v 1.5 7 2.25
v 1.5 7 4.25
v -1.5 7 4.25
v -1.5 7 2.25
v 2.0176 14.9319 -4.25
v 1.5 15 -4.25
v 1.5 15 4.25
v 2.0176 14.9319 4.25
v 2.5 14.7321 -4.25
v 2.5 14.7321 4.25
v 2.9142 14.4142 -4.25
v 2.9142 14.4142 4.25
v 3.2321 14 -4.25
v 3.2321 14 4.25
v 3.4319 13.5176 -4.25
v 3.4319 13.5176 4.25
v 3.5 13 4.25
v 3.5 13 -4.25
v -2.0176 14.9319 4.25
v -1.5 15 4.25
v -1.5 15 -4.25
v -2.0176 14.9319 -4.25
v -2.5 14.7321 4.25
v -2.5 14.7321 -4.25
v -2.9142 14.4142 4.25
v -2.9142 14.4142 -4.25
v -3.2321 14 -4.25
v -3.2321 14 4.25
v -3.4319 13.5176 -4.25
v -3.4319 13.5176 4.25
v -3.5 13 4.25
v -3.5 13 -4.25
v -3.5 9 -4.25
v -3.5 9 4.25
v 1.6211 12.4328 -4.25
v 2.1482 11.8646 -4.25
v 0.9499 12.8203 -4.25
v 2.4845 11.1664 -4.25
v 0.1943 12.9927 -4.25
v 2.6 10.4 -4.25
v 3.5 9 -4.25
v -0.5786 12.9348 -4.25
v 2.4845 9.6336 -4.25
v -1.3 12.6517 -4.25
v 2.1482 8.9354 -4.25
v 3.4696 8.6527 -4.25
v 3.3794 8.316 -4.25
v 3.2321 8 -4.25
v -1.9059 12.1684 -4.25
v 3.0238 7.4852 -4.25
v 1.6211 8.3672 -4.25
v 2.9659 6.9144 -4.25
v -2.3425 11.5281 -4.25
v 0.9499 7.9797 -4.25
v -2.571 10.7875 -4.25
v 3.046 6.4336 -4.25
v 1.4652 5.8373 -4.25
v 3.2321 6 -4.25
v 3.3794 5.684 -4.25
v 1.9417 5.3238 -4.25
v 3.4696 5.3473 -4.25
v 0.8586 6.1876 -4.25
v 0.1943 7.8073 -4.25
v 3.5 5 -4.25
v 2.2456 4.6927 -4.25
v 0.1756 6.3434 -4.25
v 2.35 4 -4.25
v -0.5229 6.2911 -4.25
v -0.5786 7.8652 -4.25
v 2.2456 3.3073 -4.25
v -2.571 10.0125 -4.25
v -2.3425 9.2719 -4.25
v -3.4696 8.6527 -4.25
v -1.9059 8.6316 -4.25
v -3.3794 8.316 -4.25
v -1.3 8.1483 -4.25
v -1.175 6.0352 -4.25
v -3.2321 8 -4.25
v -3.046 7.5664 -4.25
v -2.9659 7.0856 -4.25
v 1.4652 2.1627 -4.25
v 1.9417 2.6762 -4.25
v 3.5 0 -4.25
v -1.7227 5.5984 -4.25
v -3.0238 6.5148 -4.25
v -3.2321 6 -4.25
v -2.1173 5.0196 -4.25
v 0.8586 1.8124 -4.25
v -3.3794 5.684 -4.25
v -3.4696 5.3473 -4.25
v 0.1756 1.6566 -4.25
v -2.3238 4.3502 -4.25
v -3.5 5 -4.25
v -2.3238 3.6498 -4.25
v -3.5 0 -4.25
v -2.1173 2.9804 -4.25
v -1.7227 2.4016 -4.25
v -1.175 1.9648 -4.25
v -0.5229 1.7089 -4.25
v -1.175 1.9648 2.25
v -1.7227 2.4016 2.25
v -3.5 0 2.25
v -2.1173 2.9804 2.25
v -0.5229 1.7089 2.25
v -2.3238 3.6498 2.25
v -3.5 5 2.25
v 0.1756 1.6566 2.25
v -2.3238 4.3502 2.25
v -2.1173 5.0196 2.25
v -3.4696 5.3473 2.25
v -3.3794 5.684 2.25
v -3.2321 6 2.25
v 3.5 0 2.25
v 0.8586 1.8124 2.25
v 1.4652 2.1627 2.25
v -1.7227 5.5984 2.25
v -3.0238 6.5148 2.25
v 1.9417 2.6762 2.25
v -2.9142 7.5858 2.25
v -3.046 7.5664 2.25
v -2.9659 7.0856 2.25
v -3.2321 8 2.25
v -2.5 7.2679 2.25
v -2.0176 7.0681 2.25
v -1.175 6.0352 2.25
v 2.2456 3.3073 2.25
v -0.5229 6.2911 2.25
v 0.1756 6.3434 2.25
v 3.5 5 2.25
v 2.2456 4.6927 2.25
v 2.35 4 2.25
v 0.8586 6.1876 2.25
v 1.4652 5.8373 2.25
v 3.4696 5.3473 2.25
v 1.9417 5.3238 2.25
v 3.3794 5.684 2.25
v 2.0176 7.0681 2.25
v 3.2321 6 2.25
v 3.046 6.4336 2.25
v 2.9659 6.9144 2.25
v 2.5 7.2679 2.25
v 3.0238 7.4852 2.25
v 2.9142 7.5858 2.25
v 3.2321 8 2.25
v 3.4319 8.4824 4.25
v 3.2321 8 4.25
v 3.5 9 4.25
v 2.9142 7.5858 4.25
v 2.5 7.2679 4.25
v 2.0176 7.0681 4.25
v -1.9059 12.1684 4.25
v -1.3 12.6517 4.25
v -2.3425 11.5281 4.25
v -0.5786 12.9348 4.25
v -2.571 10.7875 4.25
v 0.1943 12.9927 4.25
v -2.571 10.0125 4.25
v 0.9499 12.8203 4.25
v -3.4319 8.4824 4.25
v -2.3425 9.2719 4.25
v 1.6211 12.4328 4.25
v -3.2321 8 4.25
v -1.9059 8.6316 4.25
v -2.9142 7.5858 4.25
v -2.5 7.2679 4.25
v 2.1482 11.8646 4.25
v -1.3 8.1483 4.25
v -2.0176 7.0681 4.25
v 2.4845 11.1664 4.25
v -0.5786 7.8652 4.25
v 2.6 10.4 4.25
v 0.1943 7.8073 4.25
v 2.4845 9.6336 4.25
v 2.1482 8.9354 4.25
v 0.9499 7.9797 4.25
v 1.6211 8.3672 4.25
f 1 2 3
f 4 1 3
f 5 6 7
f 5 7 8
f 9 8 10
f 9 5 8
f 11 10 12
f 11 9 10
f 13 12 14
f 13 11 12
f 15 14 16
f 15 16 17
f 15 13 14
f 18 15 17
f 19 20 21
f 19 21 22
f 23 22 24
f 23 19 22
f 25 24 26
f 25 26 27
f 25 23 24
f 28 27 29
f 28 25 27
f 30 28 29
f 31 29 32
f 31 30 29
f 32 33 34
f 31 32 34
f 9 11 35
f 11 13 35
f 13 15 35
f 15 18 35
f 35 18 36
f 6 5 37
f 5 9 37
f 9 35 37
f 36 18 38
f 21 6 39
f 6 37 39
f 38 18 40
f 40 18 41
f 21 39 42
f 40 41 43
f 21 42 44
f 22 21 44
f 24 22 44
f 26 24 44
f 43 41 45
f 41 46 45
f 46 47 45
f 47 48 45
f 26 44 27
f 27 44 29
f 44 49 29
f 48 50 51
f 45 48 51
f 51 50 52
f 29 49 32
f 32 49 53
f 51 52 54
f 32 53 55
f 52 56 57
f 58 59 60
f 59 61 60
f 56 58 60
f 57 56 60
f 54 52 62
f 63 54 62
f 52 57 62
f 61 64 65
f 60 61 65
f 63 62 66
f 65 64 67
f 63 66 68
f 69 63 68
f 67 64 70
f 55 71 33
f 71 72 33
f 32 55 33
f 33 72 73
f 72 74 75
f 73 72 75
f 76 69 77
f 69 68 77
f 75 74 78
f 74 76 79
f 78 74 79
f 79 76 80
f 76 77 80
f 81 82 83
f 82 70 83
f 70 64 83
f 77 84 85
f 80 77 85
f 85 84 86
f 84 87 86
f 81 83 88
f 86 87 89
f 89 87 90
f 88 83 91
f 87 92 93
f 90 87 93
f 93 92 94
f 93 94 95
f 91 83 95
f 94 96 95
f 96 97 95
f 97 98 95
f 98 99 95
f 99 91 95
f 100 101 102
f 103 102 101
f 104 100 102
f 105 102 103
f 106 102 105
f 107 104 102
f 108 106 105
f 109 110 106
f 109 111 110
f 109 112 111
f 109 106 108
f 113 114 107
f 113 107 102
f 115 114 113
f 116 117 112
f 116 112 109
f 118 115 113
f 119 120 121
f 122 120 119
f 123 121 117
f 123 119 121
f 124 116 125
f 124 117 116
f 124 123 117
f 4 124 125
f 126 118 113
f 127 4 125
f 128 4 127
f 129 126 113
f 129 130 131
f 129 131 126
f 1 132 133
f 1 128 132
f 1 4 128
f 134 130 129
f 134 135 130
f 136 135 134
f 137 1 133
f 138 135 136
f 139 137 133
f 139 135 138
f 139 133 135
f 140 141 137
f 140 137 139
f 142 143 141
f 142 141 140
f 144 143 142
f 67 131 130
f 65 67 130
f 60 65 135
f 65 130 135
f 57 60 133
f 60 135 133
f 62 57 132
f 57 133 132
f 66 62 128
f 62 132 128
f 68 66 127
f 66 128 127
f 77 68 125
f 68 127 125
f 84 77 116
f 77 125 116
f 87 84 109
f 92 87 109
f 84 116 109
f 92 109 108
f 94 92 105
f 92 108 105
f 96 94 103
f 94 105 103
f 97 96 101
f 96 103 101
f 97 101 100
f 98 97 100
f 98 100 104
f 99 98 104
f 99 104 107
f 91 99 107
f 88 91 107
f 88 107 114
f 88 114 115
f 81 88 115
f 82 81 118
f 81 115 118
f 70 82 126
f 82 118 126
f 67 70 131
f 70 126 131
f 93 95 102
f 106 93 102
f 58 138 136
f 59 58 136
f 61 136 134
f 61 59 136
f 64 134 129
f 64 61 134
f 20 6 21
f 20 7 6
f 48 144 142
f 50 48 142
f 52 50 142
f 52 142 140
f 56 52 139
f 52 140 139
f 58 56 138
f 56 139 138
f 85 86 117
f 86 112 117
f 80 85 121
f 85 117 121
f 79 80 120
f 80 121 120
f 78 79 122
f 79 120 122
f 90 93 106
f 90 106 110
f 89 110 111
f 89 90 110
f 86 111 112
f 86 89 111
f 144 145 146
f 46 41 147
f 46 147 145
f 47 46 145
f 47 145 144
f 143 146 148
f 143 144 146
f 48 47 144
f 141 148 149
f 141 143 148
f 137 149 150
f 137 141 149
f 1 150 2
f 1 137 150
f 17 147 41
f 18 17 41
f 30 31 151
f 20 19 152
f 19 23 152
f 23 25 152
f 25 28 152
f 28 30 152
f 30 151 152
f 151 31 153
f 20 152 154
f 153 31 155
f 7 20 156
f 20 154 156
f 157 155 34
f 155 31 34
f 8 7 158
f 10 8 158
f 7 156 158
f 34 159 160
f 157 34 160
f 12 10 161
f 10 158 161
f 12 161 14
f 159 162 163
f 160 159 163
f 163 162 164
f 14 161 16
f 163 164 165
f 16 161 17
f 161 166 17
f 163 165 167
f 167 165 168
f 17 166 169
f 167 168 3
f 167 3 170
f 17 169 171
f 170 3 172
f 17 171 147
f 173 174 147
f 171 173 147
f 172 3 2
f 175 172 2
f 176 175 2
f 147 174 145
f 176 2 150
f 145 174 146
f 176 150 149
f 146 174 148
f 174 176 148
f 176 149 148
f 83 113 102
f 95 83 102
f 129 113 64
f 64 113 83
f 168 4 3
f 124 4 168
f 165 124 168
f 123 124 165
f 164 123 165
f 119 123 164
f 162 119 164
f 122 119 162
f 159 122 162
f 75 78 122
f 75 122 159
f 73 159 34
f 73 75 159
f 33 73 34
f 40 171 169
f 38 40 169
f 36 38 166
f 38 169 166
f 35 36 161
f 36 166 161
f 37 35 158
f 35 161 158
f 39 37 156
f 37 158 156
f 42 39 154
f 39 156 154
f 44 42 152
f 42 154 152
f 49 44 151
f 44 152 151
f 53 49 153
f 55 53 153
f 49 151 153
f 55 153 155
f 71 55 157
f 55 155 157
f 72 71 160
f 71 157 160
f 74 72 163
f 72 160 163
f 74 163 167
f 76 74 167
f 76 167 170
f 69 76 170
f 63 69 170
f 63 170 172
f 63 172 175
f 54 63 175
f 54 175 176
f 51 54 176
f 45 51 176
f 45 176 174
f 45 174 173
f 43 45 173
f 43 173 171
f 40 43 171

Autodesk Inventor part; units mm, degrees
ref_plane "YZ Plane" through (0, 0, 0) normal (1, 0, 0) x (0, 1, 0)
ref_plane "XZ Plane" through (0, 0, 0) normal (0, 1, 0) x (-1, 0, 0)
ref_plane "XY Plane" through (0, 0, 0) normal (0, 0, 1) x (1, 0, 0)
sketch "スケッチ1" plane through (0, 0, 0) normal (0, 1, 0) x (-1, 0, 0)
  line L0 (3.5, 4.25) -> (-3.5, 4.25)
  line L1 (-3.5, 4.25) -> (-3.5, -4.25)
  line L2 (-3.5, -4.25) -> (3.5, -4.25)
  line L3 (3.5, -4.25) -> (3.5, 4.25)
  line L4 (3.5, 4.25) -> (-3.5, -4.25) construction
  line L5 (-3.5, 4.25) -> (3.5, -4.25) construction
  point P0 (0, 0)
  dimension "d0" = 7
  dimension "d1" = 8.5
extrude "押し出し1" add sketch "スケッチ1" along normal blind 15
sketch "スケッチ2" plane through (-3.5, 0, 4.25) normal (0, 0, 1) x (1, 0, 0)
  circle A0 centre (3.5, 4) radius 2.35
  line L0 (0, 0) -> (7, 0) projected
  line L1 (0, 0) -> (0, 15) projected
  circle A1 centre (3.5, 10.4) radius 2.6
  line L2 (0, 15) -> (7, 15) projected
  point P0 (3.5, 0)
  dimension "d4" = 4.7
  dimension "d5" = 4
  dimension "d6" = 3.5
  dimension "d7" = 5.2
  dimension "d8" = 4.6
  dimension "d9" = 3.5
extrude "押し出し2" cut sketch "スケッチ2" against normal blind 9
fillet "フィレット1" radius 2 1 edges at (3.5, 15, 0)
fillet "フィレット2" radius 2 1 edges at (-3.5, 15, 0)
sketch "スケッチ4" plane through (0, 0, 0) normal (0, -1, 0) x (1, 0, 0)
  line L0 (0, 6.3882) -> (0, -6.0661)
  line L1 (-5.5555, 5.25) -> (5.1337, 5.25)
  line L2 (-3.5, 4.25) -> (3.5, 4.25) projected
  point P0 (0, 0)
  dimension "d23" = 1
sketch "スケッチ6" plane through (-3.5, 0, 4.25) normal (0, 0, 1) x (1, 0, 0)
  line L0 (0, 0) -> (7, 0) projected
  line L1 (0, 0) -> (7, 0)
  line L2 (7, 0) -> (7, 7)
  line L3 (7, 7) -> (0, 7)
  line L4 (0, 7) -> (0, 0)
  point P0 (3.5, 0)
  dimension "d27" = 7
  dimension "d28" = 7
extrude "押し出し4" cut sketch "スケッチ6" against normal blind 2
sketch "スケッチ8" plane through (3.5, 0, -4.25) normal (0, 0, -1) x (-1, 0, 0)
  arc A0 (2, 7) -> (0, 5) centre (2, 5) ccw
  arc A1 (7, 5) -> (5, 7) centre (5, 5) ccw
  line L0 (0, 7) -> (7, 7) construction
  line L1 (0, 0) -> (7, 0) construction
  line L2 (0, 0) -> (0, 13) construction
  line L3 (7, 0) -> (7, 13) construction
  arc A2 (0, 9) -> (2, 7) centre (2, 9) ccw
  arc A3 (5, 7) -> (7, 9) centre (5, 9) ccw
  line L4 (0, 5) -> (0, 9)
  line L5 (7, 5) -> (7, 9)
  line L6 (7, 7) -> (7, 13) projected
  point P0 (3.5, 0)
  dimension "d33" = 2
  dimension "d34" = 7
extrude "押し出し5" cut sketch "スケッチ8" against normal blind 8.5
fillet "フィレット3" radius 2 2 edges at (1.5, 7, -1) (-1.5, 7, -1)
sketch "スケッチ9" plane through (-3.5, 0, 2.25) normal (0, 0, 1) x (1, 0, 0)
  arc A0 (7, 5) -> (6.7321, 6) centre (5, 5) ccw projected
  line L0 (7, 0) -> (7, 5) projected
  line L1 (7, 0) -> (0, 0) projected
  line L2 (0, 0) -> (0, 5) projected
  arc A1 (0.2679, 6) -> (0, 5) centre (2, 5) ccw projected
  arc A2 (0.2679, 6) -> (0.2679, 8) centre (-1.4641, 7) ccw projected
  arc A3 (0, 9) -> (0.2679, 8) centre (2, 9) ccw projected
  line L3 (0, 9) -> (0, 13) projected
  arc A4 (2, 15) -> (0, 13) centre (2, 13) ccw projected
  line L4 (5, 15) -> (2, 15) projected
  arc A5 (7, 13) -> (5, 15) centre (5, 13) ccw projected
  line L5 (7, 9) -> (7, 13) projected
  arc A6 (6.7321, 8) -> (7, 9) centre (5, 9) ccw projected
  arc A7 (6.7321, 8) -> (6.7321, 6) centre (8.4641, 7) ccw projected
  circle A8 centre (3.5, 10.4) radius 2.6 projected
  circle A9 centre (3.5, 4) radius 2.35 projected
  arc A10 (5, 7) -> (6.7321, 8) centre (5, 9) ccw projected
  line L6 (2, 7) -> (5, 7) projected
  arc A11 (0.2679, 8) -> (2, 7) centre (2, 9) ccw projected
  point P0 (3.5, 0)
properties part number "LED_mount"
